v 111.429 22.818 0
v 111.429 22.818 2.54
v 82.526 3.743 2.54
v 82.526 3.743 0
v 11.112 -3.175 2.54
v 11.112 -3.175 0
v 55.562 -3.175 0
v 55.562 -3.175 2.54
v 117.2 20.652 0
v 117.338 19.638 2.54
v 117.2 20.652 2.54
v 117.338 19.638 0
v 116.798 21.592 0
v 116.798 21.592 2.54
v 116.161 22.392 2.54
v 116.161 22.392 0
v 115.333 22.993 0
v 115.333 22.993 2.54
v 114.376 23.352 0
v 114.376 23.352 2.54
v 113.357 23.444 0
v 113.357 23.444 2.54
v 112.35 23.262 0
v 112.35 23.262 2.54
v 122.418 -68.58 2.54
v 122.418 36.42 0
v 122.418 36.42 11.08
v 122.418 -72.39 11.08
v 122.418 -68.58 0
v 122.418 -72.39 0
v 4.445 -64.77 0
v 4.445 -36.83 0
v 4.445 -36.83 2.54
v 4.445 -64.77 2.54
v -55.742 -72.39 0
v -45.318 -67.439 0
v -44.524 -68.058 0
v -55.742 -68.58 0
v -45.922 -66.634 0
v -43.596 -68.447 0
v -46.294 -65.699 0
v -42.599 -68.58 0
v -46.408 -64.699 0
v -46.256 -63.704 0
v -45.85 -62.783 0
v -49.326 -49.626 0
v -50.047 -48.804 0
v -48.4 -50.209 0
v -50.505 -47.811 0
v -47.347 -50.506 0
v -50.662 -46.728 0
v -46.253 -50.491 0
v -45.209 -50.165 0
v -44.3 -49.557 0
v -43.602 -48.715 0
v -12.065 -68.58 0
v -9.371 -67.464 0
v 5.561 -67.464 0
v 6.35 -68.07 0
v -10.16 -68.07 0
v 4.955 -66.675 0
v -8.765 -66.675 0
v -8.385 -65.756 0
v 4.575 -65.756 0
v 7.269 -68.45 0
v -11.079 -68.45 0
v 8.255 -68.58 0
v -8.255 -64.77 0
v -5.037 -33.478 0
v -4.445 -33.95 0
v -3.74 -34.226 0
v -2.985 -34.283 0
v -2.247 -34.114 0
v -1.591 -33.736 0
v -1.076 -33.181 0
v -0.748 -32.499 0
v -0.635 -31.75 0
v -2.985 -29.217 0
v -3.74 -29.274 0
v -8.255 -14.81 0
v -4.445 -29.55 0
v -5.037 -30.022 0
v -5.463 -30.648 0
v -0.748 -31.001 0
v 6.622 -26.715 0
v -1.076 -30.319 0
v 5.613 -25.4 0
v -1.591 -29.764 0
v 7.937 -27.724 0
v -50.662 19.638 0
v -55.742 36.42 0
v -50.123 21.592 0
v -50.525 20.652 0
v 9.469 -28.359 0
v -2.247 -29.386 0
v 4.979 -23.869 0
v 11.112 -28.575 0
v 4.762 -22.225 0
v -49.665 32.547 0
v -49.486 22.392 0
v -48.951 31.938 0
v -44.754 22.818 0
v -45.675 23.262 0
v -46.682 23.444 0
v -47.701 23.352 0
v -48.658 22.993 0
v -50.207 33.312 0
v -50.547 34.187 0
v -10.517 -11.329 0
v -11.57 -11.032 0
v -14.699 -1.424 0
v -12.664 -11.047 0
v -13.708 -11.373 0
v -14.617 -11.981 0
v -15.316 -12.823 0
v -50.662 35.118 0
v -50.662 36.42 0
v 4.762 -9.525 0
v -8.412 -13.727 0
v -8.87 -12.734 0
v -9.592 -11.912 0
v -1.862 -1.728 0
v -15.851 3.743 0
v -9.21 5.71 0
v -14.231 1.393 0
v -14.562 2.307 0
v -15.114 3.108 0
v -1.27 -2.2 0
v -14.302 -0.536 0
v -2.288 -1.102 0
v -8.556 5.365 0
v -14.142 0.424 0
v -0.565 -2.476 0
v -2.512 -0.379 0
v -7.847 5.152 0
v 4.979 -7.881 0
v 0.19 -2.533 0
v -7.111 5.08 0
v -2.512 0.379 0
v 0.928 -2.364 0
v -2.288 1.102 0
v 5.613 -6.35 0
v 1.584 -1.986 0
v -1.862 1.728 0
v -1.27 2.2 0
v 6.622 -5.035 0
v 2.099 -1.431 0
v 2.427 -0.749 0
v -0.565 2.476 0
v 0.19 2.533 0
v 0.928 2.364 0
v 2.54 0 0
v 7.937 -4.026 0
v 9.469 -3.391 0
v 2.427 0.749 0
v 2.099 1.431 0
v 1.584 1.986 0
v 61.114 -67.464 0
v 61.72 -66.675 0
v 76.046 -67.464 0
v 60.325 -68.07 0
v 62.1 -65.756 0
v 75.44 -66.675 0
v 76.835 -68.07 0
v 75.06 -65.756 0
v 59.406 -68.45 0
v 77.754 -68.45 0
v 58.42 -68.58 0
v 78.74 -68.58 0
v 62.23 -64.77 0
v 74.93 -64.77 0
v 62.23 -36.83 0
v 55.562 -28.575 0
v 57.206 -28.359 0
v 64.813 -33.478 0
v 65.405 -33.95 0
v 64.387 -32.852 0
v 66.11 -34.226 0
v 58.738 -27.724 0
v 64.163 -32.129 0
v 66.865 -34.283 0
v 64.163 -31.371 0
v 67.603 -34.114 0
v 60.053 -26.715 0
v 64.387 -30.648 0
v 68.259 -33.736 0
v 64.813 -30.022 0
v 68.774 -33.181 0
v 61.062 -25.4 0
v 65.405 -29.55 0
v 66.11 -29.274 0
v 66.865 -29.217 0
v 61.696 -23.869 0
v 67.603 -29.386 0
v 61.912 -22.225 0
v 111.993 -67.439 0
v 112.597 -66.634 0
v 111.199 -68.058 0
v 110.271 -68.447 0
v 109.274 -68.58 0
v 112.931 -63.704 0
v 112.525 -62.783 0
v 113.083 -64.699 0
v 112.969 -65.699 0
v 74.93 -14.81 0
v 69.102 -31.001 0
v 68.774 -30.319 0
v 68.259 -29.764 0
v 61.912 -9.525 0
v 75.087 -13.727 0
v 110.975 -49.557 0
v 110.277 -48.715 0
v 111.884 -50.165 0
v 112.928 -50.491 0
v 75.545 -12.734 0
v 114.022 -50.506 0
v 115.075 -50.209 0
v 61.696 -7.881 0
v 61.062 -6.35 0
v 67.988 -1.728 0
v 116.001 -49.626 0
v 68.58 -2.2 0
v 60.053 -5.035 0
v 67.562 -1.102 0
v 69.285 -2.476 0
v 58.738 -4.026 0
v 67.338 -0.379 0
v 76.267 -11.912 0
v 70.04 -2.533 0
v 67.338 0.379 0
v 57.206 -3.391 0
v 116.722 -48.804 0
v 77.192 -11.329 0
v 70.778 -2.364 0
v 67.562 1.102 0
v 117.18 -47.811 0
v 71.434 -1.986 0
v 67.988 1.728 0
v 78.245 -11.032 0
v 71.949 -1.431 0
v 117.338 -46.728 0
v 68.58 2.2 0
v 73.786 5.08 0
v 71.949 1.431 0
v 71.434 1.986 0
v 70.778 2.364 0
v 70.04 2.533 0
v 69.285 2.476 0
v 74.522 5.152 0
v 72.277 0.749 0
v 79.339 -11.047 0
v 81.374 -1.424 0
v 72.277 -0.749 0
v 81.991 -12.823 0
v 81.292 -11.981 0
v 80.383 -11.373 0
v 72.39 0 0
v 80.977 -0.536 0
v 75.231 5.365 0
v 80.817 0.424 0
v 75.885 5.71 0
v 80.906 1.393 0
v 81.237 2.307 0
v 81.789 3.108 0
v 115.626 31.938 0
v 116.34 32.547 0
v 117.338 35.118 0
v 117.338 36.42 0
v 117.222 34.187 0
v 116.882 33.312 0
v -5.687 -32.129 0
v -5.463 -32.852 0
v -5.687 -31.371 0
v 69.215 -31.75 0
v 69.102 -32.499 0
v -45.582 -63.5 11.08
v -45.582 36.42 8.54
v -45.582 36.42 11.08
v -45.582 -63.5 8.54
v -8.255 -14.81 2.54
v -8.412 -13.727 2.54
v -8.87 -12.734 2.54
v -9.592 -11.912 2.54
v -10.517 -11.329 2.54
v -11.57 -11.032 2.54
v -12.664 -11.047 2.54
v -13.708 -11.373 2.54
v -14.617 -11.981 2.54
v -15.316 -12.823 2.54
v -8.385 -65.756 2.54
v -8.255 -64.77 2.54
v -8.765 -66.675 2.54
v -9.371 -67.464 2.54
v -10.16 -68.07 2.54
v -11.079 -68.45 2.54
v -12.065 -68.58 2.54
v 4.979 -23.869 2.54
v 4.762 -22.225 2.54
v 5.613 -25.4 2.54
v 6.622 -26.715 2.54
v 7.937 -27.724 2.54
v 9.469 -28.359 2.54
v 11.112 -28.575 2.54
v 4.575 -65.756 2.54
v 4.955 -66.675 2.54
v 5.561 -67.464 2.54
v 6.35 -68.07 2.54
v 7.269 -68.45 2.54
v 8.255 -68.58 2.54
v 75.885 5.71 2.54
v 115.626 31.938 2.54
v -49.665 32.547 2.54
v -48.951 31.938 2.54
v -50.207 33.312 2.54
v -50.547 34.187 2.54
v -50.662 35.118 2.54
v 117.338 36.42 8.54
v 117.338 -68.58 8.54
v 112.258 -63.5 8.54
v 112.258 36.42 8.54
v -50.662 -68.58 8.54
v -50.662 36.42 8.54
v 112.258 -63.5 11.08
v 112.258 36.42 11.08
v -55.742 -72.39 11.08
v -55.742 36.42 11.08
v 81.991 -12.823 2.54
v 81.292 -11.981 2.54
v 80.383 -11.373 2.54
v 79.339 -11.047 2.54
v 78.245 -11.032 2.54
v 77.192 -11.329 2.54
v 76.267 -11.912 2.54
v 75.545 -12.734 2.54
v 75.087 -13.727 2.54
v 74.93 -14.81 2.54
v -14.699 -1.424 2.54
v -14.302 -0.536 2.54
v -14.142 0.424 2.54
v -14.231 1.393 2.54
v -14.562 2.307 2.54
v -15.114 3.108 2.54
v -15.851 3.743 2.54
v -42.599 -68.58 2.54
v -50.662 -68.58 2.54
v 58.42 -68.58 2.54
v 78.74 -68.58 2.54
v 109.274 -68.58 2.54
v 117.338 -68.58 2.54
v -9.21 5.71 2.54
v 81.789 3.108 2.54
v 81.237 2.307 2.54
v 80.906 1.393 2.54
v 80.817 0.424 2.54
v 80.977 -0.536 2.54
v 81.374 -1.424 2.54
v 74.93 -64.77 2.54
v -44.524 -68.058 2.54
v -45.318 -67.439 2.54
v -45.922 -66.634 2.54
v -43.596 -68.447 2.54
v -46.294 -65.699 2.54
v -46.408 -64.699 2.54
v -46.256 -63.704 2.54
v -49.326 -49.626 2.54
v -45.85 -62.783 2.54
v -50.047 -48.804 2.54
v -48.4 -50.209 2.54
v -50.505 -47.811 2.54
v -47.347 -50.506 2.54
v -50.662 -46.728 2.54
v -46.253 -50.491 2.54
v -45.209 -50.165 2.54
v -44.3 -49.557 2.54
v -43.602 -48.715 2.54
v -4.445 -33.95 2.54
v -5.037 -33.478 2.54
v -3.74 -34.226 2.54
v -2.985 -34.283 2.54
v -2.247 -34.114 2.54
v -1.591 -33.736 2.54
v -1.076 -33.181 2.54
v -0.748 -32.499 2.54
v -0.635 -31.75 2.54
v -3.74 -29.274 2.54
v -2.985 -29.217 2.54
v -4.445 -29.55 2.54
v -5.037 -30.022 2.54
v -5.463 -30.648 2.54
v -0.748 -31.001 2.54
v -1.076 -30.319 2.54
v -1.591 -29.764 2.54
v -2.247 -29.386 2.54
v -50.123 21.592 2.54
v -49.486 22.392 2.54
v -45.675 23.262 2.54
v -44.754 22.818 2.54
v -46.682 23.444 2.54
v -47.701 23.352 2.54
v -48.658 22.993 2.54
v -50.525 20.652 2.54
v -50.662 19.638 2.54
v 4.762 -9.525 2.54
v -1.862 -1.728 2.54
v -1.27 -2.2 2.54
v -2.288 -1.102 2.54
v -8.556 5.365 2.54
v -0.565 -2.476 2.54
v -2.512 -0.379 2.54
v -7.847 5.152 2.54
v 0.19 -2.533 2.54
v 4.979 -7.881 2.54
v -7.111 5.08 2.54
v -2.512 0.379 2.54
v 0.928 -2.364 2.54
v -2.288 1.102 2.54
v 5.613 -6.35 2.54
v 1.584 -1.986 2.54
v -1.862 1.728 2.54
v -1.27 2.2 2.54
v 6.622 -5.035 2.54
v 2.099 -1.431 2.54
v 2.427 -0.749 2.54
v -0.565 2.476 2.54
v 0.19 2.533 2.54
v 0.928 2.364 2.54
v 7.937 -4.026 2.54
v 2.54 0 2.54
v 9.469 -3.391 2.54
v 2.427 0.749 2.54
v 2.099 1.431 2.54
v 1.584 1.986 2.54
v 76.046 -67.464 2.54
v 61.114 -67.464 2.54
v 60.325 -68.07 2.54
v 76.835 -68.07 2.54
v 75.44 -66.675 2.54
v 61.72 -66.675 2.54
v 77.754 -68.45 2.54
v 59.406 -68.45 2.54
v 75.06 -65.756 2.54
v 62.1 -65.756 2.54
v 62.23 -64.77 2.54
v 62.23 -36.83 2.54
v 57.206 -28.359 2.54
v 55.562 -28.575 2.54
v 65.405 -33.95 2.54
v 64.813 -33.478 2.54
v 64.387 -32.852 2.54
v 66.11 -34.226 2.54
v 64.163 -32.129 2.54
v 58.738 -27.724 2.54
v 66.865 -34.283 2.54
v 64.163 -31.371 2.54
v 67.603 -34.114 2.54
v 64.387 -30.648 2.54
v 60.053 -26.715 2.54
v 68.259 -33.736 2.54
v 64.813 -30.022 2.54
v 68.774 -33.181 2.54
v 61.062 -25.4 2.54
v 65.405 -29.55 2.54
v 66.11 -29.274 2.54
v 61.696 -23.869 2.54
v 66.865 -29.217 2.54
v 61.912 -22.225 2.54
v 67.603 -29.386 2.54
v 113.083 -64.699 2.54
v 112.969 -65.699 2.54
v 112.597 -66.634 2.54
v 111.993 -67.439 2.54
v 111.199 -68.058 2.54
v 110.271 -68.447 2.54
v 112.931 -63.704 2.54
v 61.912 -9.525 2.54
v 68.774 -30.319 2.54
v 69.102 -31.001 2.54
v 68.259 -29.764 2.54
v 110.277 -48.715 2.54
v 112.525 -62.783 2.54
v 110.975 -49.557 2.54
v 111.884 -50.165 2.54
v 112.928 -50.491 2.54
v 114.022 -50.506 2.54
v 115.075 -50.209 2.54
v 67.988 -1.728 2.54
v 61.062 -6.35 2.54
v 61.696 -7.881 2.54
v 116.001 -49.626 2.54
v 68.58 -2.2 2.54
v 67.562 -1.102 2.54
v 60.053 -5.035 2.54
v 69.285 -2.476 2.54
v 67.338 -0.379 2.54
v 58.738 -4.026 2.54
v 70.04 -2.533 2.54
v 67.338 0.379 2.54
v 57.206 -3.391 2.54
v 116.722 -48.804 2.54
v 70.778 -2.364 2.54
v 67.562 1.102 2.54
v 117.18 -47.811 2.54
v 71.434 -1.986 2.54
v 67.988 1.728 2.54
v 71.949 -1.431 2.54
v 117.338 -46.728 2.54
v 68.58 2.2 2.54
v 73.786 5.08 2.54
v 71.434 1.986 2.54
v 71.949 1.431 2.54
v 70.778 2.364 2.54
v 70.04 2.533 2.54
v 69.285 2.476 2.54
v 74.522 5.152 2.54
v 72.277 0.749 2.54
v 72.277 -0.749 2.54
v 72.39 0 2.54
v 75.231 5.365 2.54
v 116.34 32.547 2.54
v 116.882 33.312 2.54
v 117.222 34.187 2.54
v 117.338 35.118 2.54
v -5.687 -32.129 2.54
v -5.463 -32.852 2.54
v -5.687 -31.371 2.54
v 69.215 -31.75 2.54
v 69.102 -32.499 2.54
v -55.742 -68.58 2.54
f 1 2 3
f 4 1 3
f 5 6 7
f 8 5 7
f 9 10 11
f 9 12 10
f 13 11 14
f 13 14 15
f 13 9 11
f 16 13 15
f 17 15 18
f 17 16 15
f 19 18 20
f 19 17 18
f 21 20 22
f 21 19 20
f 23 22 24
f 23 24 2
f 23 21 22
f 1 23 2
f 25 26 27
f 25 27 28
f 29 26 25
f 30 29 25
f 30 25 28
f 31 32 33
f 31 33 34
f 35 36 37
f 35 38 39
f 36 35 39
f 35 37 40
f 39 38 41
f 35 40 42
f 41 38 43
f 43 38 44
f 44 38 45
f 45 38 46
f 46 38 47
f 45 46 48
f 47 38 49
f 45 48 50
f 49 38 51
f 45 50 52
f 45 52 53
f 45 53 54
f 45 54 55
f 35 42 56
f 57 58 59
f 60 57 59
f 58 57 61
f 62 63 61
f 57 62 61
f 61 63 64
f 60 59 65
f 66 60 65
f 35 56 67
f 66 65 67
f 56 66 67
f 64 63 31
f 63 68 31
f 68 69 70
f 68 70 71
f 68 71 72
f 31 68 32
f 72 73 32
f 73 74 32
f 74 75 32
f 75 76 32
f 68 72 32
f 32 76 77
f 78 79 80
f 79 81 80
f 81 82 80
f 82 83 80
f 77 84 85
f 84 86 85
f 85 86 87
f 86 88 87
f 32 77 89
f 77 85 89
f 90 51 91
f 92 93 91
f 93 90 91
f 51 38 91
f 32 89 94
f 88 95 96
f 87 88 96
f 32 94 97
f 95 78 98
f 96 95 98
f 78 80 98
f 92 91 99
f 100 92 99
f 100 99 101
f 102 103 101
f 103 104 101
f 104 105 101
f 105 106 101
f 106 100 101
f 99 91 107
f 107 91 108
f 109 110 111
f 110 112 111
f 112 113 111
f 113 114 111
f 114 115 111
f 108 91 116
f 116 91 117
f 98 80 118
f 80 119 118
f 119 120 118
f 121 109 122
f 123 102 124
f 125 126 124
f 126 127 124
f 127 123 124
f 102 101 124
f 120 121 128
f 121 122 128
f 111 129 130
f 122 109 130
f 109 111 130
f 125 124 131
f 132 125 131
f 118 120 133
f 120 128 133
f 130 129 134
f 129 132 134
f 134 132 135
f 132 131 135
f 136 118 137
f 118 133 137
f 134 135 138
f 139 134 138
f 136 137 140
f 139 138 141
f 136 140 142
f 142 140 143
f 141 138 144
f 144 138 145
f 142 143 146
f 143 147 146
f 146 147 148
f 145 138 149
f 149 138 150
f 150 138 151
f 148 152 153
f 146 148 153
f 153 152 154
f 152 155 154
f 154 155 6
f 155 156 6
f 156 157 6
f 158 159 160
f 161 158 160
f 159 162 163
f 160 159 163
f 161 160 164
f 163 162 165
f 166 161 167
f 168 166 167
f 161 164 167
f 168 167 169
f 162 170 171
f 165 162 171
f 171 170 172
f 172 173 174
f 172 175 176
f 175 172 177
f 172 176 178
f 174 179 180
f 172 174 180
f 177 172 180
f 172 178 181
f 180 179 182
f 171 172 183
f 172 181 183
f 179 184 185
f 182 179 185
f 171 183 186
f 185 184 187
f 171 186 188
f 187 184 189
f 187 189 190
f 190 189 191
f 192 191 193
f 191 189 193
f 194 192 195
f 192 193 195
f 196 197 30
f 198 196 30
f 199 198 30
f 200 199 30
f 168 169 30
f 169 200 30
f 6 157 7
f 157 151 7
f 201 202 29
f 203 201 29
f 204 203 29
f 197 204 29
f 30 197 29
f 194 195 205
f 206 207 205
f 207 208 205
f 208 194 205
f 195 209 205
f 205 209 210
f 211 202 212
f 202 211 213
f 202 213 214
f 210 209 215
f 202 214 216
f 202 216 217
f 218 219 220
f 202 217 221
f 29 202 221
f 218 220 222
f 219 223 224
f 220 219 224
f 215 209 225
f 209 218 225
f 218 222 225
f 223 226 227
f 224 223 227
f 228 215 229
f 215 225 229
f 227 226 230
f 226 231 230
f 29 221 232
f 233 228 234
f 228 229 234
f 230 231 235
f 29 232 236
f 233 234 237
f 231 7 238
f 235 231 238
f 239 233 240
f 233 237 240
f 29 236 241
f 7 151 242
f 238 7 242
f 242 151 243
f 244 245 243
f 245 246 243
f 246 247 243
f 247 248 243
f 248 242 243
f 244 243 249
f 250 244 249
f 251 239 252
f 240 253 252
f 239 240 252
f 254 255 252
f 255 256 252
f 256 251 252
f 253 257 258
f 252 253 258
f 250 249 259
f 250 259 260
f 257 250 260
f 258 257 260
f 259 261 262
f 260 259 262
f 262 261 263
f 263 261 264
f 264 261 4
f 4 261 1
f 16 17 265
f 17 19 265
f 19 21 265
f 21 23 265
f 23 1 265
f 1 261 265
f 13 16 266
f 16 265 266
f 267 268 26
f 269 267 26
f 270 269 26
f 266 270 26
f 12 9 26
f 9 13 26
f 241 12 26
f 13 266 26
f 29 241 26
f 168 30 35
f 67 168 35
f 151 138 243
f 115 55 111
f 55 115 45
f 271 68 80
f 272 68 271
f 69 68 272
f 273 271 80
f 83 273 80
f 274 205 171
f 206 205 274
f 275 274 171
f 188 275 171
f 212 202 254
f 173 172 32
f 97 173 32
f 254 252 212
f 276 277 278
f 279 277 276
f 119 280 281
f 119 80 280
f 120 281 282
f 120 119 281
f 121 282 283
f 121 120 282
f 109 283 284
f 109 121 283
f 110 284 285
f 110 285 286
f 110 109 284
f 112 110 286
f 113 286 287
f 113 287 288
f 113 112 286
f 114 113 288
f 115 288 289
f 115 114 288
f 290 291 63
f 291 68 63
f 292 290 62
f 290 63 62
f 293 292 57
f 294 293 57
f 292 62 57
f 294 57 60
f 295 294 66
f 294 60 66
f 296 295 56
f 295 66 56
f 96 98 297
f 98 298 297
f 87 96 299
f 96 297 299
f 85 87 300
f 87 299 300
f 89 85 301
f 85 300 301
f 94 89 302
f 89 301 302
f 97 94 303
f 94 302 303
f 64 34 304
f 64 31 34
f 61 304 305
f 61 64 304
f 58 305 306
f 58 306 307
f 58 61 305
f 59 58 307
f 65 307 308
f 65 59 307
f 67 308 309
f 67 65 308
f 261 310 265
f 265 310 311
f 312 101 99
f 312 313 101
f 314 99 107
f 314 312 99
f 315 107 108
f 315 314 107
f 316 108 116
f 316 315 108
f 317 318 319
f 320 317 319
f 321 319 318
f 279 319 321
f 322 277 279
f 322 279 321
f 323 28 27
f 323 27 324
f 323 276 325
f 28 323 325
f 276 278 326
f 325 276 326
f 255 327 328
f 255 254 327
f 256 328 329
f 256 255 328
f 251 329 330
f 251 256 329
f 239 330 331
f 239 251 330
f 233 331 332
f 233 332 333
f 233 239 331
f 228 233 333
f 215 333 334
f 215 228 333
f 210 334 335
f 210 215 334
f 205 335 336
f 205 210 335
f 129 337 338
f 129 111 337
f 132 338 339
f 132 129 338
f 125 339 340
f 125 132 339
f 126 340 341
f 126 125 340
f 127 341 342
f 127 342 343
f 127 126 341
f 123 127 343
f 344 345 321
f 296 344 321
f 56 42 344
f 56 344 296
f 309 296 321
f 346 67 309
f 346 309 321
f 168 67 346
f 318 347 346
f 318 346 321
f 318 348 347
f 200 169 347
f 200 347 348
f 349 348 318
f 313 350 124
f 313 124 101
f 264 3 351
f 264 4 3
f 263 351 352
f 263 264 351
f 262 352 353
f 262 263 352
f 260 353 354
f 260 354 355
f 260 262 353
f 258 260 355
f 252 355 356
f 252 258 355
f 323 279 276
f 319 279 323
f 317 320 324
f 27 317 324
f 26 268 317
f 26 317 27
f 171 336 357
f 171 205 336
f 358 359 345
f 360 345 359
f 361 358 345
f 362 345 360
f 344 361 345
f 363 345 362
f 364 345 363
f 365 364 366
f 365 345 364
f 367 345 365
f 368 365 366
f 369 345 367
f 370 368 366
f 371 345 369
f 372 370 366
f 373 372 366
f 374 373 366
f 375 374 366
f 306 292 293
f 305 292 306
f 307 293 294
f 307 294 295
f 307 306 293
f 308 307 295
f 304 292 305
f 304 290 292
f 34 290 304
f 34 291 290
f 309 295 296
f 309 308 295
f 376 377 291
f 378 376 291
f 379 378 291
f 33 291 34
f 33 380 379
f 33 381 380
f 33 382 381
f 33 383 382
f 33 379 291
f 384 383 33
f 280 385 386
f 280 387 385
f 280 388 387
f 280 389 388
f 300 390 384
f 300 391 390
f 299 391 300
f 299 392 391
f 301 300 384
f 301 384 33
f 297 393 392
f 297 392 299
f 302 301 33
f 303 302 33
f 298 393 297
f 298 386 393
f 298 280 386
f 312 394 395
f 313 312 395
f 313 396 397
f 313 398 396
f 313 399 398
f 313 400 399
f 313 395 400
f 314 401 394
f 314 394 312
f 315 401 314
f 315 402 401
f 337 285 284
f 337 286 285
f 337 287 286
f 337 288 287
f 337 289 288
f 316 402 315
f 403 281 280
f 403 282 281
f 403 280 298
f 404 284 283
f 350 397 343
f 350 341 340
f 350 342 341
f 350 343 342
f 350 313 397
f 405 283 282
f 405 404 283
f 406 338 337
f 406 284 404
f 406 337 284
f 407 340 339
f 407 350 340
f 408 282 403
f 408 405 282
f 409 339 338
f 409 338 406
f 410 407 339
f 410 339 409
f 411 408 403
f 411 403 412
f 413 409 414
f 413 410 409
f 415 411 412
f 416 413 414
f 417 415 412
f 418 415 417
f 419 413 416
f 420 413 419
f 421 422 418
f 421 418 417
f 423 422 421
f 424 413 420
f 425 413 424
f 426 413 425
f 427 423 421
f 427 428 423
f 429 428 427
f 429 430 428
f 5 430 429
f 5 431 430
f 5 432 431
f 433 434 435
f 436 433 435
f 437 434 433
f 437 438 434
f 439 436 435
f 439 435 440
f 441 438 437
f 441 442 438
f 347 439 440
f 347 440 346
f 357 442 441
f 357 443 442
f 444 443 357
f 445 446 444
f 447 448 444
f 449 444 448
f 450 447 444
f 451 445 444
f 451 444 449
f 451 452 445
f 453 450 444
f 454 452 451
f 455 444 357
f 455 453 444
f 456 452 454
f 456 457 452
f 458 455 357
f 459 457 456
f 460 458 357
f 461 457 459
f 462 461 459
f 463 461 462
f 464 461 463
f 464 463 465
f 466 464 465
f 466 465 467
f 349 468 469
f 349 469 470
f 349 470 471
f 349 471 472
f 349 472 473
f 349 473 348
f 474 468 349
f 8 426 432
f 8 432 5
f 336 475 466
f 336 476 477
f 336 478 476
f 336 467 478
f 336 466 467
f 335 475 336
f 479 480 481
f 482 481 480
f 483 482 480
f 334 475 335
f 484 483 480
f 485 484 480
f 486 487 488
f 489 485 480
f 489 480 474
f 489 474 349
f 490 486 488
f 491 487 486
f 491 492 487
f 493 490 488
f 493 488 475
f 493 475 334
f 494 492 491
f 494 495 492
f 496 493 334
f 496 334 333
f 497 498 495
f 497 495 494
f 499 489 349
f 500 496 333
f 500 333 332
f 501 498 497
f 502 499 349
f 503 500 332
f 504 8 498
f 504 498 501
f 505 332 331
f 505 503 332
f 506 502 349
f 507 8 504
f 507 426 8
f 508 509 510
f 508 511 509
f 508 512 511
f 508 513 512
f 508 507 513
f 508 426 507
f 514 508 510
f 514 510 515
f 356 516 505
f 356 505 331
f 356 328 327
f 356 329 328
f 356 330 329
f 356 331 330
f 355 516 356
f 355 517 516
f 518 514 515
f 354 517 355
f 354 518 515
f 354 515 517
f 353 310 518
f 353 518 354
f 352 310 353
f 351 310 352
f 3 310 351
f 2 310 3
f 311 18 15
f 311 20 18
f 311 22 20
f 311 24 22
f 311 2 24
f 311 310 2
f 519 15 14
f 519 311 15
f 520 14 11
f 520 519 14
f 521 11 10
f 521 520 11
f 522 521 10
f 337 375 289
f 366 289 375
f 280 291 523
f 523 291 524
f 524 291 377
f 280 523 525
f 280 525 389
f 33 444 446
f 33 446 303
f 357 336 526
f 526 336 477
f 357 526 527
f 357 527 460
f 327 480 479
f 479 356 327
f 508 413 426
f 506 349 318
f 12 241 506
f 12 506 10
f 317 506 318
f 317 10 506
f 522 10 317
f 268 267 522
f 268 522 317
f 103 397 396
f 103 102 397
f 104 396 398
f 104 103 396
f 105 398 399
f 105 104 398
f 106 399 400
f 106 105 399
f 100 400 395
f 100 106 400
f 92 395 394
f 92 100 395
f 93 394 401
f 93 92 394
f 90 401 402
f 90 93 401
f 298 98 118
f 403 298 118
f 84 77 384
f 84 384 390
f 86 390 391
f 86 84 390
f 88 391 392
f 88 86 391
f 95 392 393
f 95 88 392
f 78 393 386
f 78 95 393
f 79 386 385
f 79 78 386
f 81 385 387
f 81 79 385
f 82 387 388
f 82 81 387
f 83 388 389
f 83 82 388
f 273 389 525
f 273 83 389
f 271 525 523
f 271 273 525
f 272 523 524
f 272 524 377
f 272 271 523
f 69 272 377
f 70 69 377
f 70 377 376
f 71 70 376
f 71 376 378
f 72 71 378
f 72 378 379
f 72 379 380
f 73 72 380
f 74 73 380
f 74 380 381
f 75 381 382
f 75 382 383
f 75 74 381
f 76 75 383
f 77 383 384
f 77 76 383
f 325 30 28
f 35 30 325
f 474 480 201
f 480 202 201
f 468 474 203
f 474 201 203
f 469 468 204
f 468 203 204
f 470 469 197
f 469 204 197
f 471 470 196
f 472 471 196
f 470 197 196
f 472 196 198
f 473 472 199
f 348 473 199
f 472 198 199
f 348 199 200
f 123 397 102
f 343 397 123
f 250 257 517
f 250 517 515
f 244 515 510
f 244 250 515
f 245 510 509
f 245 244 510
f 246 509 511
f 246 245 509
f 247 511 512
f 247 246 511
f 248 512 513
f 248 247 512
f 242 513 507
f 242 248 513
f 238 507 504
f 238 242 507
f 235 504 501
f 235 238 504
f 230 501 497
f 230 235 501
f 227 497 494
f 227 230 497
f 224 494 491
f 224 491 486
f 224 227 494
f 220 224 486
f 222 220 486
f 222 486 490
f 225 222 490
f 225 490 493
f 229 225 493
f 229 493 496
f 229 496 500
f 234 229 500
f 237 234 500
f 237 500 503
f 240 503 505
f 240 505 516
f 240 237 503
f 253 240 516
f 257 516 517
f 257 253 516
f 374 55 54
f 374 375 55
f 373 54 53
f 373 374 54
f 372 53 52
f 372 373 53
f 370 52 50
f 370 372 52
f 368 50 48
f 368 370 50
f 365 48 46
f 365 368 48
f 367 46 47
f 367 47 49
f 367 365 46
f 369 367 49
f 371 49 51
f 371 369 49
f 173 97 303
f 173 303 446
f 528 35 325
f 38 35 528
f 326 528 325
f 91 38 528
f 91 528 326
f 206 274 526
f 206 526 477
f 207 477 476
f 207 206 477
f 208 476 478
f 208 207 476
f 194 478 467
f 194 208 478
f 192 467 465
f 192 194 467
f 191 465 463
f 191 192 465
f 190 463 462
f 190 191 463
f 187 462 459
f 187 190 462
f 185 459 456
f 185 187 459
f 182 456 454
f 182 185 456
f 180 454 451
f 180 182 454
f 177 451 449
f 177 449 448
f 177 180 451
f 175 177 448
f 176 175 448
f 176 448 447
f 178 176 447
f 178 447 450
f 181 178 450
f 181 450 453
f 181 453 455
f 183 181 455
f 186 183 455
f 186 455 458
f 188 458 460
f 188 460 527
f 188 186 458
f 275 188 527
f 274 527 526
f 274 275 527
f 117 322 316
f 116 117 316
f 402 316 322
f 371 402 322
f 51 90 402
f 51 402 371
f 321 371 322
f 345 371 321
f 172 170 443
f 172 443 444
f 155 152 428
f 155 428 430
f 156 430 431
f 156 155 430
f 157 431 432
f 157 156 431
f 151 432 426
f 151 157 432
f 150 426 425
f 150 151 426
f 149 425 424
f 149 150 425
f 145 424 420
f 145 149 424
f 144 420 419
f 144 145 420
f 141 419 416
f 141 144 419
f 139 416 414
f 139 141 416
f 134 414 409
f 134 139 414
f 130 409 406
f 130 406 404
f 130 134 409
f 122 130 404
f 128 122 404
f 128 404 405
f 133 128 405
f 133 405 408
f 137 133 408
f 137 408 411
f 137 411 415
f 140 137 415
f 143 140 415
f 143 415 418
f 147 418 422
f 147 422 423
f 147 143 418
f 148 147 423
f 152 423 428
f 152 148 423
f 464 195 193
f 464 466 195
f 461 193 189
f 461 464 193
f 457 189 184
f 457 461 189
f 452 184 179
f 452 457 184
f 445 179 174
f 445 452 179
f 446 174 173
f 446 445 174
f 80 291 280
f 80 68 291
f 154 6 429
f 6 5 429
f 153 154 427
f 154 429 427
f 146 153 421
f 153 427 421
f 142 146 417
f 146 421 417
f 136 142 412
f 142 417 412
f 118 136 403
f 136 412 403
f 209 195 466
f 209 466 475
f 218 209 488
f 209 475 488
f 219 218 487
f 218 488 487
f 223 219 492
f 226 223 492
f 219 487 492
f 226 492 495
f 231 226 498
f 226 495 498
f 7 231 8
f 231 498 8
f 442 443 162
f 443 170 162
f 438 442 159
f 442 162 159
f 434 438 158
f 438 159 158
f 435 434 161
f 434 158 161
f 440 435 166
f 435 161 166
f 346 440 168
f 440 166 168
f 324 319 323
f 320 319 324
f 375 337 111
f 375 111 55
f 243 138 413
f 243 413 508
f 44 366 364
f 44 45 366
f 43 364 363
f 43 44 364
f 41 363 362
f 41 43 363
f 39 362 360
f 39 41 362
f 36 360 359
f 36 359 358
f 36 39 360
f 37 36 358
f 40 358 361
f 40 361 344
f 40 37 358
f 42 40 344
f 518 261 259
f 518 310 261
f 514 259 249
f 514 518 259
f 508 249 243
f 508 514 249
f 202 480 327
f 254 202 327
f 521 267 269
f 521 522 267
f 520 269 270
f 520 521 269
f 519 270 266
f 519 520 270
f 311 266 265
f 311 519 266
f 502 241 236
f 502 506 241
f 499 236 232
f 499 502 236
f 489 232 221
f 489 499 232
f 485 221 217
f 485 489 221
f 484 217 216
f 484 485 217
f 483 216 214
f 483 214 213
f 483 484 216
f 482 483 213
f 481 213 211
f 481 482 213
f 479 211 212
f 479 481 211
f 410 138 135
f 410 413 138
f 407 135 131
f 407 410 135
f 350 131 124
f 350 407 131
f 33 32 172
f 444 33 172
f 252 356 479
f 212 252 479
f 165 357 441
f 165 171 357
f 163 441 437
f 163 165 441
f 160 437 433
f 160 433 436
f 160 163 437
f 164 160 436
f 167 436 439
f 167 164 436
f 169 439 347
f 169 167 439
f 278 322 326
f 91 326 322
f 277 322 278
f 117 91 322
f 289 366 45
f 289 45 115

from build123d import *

# Parameters (mm, degrees)
SKETCH1_W                    = 83.185
SKETCH1_H                    = 41.91
SKETCH1_R                    = 2.54
SKETCH1_W_2                  = 57.15
SKETCH1_H_2                  = 25.4
ROVER_MOUNT_DEPTH            = 2.54
SIDE_WALLS_REACH             = 85.531
SIDE_WALLS_DIRECTION_2_DEPTH = 6.000000034
BACK_BRACES_DEPTH            = 2.54
FRONT_COVER_DEPTH            = 2.54
SKETCH5_W                    = 83.185
SKETCH5_H                    = 6.000000034
CLEANUP_DEPTH                = 31.75
FILLET1_R                    = 3.81
FILLET2_R                    = 6.35


with BuildPart() as part:
    # Sketch1 → Rover mount (new body)
    with BuildSketch(Plane.XY):
        with Locations((33.3375, -15.875)):
            Rectangle(SKETCH1_W, SKETCH1_H)
        with Locations((66.675, -31.75)):
            Circle(SKETCH1_R, mode=Mode.SUBTRACT)
        with Locations((69.85, 0)):
            Circle(SKETCH1_R, mode=Mode.SUBTRACT)
        with Locations((-3.175, -31.75)):
            Circle(SKETCH1_R, mode=Mode.SUBTRACT)
        Circle(SKETCH1_R, mode=Mode.SUBTRACT)
        with Locations((33.3375, -15.875)):
            Rectangle(SKETCH1_W_2, SKETCH1_H_2, mode=Mode.SUBTRACT)
    extrude(amount=ROVER_MOUNT_DEPTH)

    # Side Walls: up to this face of the body (flat: up to its plane)
    side_walls_end = Plane(part.part.faces().sort_by_distance((73.998539194, -15.875, 0))[0])
    # Sketch2 → Side Walls (add, up to the picked face)
    with BuildSketch(Plane.XY.offset(2.54), mode=Mode.PRIVATE) as side_walls_sk1:
        Polygon((-50.6625, -68.58), (-8.255, -68.58), (-8.255, -36.83), (4.445, -36.83), (4.445, -68.58), (62.23, -68.58), (62.23, -36.83), (74.93, -36.83), (74.93, -68.58), (117.3375, -68.58), (117.3375, 36.42), (122.4175, 36.42), (122.4175, -72.39), (-55.7425, -72.39), (-55.7425, 36.42), (-50.6625, 36.42), align=None)
    side_walls_tool1 = split(extrude(side_walls_sk1.sketch, amount=-SIDE_WALLS_REACH, mode=Mode.PRIVATE), bisect_by=side_walls_end, keep=Keep.BOTH, mode=Mode.PRIVATE)
    add(side_walls_tool1.solids().sort_by(Axis((-29.45875, -70.667597, 2.54), (0, 0, -1)))[0])

    # Sketch2 → Side Walls direction 2 (add)
    with BuildSketch(Plane.XY.offset(2.54)):
        Polygon((-50.6625, -68.58), (-8.255, -68.58), (-8.255, -36.83), (4.445, -36.83), (4.445, -68.58), (62.23, -68.58), (62.23, -36.83), (74.93, -36.83), (74.93, -68.58), (117.3375, -68.58), (117.3375, 36.42), (122.4175, 36.42), (122.4175, -72.39), (-55.7425, -72.39), (-55.7425, 36.42), (-50.6625, 36.42), align=None)
    extrude(amount=SIDE_WALLS_DIRECTION_2_DEPTH)

    # Sketch3 → Back Braces (add)
    with BuildSketch(Plane.XY.offset(2.54)):
        Polygon((-12.779899069, 1.716266635), (-55.7425, -68.58), (-49.3925, -68.58), (-8.255, -1.27), (-8.255, 5.08), (-55.7425, 36.42), (-55.7425, 30.07), align=None)
        Polygon((79.454899069, 1.716266635), (122.4175, -68.58), (116.0675, -68.58), (74.93, -1.27), (74.93, 5.08), (122.4175, 36.42), (122.4175, 30.07), align=None)
    extrude(amount=-BACK_BRACES_DEPTH)

    # Sketch4 → Front Cover (add)
    with BuildSketch(Plane.XY.offset(8.540000034)):
        Polygon((-55.7425, 36.42), (-45.5825, 36.42), (-45.5825, -63.5), (112.2575, -63.5), (112.2575, 36.42), (122.4175, 36.42), (122.4175, -72.39), (-55.7425, -72.39), align=None)
    extrude(amount=FRONT_COVER_DEPTH)

    # Sketch5 → Cleanup (cut)
    with BuildSketch(Plane(origin=(0, -36.83, 0), x_dir=(1, 0, 0), z_dir=(0, 1, 0))):
        with Locations((33.3375, -5.540000017)):
            Rectangle(SKETCH5_W, SKETCH5_H)
    extrude(amount=-CLEANUP_DEPTH, mode=Mode.SUBTRACT)

    # Fillet1
    fillet1_edges = [part.edges().sort_by_distance(p)[0] for p in [
        (117.3375, 26.717387207, 1.27),
        (117.3375, 33.067387207, 1.27),
        (117.3375, -60.268002431, 1.27),
        (79.454899069, 1.716266635, 1.27),
        (116.0675, -68.58, 1.27),
        (74.93, -1.27, 1.27),
        (-8.255, -68.58, 1.27),
        (4.445, -68.58, 1.27),
        (62.23, -68.58, 1.27),
        (74.93, -68.58, 1.27),
        (-8.255, 5.08, 1.27),
        (74.93, 5.08, 1.27),
        (-49.3925, -68.58, 1.27),
        (-12.779899069, 1.716266635, 1.27),
        (-50.6625, 33.067387207, 1.27),
        (-8.255, -1.27, 1.27),
        (-50.6625, -60.268002431, 1.27),
        (-50.6625, 26.717387207, 1.27),
    ]]
    fillet(fillet1_edges, radius=FILLET1_R)

    # Fillet2
    fillet2_edges = [part.edges().sort_by_distance(p)[0] for p in [
        (4.7625, -3.175, 1.27),
        (4.7625, -28.575, 1.27),
        (61.9125, -28.575, 1.27),
        (61.9125, -3.175, 1.27),
    ]]
    fillet(fillet2_edges, radius=FILLET2_R)


solid = part.part
